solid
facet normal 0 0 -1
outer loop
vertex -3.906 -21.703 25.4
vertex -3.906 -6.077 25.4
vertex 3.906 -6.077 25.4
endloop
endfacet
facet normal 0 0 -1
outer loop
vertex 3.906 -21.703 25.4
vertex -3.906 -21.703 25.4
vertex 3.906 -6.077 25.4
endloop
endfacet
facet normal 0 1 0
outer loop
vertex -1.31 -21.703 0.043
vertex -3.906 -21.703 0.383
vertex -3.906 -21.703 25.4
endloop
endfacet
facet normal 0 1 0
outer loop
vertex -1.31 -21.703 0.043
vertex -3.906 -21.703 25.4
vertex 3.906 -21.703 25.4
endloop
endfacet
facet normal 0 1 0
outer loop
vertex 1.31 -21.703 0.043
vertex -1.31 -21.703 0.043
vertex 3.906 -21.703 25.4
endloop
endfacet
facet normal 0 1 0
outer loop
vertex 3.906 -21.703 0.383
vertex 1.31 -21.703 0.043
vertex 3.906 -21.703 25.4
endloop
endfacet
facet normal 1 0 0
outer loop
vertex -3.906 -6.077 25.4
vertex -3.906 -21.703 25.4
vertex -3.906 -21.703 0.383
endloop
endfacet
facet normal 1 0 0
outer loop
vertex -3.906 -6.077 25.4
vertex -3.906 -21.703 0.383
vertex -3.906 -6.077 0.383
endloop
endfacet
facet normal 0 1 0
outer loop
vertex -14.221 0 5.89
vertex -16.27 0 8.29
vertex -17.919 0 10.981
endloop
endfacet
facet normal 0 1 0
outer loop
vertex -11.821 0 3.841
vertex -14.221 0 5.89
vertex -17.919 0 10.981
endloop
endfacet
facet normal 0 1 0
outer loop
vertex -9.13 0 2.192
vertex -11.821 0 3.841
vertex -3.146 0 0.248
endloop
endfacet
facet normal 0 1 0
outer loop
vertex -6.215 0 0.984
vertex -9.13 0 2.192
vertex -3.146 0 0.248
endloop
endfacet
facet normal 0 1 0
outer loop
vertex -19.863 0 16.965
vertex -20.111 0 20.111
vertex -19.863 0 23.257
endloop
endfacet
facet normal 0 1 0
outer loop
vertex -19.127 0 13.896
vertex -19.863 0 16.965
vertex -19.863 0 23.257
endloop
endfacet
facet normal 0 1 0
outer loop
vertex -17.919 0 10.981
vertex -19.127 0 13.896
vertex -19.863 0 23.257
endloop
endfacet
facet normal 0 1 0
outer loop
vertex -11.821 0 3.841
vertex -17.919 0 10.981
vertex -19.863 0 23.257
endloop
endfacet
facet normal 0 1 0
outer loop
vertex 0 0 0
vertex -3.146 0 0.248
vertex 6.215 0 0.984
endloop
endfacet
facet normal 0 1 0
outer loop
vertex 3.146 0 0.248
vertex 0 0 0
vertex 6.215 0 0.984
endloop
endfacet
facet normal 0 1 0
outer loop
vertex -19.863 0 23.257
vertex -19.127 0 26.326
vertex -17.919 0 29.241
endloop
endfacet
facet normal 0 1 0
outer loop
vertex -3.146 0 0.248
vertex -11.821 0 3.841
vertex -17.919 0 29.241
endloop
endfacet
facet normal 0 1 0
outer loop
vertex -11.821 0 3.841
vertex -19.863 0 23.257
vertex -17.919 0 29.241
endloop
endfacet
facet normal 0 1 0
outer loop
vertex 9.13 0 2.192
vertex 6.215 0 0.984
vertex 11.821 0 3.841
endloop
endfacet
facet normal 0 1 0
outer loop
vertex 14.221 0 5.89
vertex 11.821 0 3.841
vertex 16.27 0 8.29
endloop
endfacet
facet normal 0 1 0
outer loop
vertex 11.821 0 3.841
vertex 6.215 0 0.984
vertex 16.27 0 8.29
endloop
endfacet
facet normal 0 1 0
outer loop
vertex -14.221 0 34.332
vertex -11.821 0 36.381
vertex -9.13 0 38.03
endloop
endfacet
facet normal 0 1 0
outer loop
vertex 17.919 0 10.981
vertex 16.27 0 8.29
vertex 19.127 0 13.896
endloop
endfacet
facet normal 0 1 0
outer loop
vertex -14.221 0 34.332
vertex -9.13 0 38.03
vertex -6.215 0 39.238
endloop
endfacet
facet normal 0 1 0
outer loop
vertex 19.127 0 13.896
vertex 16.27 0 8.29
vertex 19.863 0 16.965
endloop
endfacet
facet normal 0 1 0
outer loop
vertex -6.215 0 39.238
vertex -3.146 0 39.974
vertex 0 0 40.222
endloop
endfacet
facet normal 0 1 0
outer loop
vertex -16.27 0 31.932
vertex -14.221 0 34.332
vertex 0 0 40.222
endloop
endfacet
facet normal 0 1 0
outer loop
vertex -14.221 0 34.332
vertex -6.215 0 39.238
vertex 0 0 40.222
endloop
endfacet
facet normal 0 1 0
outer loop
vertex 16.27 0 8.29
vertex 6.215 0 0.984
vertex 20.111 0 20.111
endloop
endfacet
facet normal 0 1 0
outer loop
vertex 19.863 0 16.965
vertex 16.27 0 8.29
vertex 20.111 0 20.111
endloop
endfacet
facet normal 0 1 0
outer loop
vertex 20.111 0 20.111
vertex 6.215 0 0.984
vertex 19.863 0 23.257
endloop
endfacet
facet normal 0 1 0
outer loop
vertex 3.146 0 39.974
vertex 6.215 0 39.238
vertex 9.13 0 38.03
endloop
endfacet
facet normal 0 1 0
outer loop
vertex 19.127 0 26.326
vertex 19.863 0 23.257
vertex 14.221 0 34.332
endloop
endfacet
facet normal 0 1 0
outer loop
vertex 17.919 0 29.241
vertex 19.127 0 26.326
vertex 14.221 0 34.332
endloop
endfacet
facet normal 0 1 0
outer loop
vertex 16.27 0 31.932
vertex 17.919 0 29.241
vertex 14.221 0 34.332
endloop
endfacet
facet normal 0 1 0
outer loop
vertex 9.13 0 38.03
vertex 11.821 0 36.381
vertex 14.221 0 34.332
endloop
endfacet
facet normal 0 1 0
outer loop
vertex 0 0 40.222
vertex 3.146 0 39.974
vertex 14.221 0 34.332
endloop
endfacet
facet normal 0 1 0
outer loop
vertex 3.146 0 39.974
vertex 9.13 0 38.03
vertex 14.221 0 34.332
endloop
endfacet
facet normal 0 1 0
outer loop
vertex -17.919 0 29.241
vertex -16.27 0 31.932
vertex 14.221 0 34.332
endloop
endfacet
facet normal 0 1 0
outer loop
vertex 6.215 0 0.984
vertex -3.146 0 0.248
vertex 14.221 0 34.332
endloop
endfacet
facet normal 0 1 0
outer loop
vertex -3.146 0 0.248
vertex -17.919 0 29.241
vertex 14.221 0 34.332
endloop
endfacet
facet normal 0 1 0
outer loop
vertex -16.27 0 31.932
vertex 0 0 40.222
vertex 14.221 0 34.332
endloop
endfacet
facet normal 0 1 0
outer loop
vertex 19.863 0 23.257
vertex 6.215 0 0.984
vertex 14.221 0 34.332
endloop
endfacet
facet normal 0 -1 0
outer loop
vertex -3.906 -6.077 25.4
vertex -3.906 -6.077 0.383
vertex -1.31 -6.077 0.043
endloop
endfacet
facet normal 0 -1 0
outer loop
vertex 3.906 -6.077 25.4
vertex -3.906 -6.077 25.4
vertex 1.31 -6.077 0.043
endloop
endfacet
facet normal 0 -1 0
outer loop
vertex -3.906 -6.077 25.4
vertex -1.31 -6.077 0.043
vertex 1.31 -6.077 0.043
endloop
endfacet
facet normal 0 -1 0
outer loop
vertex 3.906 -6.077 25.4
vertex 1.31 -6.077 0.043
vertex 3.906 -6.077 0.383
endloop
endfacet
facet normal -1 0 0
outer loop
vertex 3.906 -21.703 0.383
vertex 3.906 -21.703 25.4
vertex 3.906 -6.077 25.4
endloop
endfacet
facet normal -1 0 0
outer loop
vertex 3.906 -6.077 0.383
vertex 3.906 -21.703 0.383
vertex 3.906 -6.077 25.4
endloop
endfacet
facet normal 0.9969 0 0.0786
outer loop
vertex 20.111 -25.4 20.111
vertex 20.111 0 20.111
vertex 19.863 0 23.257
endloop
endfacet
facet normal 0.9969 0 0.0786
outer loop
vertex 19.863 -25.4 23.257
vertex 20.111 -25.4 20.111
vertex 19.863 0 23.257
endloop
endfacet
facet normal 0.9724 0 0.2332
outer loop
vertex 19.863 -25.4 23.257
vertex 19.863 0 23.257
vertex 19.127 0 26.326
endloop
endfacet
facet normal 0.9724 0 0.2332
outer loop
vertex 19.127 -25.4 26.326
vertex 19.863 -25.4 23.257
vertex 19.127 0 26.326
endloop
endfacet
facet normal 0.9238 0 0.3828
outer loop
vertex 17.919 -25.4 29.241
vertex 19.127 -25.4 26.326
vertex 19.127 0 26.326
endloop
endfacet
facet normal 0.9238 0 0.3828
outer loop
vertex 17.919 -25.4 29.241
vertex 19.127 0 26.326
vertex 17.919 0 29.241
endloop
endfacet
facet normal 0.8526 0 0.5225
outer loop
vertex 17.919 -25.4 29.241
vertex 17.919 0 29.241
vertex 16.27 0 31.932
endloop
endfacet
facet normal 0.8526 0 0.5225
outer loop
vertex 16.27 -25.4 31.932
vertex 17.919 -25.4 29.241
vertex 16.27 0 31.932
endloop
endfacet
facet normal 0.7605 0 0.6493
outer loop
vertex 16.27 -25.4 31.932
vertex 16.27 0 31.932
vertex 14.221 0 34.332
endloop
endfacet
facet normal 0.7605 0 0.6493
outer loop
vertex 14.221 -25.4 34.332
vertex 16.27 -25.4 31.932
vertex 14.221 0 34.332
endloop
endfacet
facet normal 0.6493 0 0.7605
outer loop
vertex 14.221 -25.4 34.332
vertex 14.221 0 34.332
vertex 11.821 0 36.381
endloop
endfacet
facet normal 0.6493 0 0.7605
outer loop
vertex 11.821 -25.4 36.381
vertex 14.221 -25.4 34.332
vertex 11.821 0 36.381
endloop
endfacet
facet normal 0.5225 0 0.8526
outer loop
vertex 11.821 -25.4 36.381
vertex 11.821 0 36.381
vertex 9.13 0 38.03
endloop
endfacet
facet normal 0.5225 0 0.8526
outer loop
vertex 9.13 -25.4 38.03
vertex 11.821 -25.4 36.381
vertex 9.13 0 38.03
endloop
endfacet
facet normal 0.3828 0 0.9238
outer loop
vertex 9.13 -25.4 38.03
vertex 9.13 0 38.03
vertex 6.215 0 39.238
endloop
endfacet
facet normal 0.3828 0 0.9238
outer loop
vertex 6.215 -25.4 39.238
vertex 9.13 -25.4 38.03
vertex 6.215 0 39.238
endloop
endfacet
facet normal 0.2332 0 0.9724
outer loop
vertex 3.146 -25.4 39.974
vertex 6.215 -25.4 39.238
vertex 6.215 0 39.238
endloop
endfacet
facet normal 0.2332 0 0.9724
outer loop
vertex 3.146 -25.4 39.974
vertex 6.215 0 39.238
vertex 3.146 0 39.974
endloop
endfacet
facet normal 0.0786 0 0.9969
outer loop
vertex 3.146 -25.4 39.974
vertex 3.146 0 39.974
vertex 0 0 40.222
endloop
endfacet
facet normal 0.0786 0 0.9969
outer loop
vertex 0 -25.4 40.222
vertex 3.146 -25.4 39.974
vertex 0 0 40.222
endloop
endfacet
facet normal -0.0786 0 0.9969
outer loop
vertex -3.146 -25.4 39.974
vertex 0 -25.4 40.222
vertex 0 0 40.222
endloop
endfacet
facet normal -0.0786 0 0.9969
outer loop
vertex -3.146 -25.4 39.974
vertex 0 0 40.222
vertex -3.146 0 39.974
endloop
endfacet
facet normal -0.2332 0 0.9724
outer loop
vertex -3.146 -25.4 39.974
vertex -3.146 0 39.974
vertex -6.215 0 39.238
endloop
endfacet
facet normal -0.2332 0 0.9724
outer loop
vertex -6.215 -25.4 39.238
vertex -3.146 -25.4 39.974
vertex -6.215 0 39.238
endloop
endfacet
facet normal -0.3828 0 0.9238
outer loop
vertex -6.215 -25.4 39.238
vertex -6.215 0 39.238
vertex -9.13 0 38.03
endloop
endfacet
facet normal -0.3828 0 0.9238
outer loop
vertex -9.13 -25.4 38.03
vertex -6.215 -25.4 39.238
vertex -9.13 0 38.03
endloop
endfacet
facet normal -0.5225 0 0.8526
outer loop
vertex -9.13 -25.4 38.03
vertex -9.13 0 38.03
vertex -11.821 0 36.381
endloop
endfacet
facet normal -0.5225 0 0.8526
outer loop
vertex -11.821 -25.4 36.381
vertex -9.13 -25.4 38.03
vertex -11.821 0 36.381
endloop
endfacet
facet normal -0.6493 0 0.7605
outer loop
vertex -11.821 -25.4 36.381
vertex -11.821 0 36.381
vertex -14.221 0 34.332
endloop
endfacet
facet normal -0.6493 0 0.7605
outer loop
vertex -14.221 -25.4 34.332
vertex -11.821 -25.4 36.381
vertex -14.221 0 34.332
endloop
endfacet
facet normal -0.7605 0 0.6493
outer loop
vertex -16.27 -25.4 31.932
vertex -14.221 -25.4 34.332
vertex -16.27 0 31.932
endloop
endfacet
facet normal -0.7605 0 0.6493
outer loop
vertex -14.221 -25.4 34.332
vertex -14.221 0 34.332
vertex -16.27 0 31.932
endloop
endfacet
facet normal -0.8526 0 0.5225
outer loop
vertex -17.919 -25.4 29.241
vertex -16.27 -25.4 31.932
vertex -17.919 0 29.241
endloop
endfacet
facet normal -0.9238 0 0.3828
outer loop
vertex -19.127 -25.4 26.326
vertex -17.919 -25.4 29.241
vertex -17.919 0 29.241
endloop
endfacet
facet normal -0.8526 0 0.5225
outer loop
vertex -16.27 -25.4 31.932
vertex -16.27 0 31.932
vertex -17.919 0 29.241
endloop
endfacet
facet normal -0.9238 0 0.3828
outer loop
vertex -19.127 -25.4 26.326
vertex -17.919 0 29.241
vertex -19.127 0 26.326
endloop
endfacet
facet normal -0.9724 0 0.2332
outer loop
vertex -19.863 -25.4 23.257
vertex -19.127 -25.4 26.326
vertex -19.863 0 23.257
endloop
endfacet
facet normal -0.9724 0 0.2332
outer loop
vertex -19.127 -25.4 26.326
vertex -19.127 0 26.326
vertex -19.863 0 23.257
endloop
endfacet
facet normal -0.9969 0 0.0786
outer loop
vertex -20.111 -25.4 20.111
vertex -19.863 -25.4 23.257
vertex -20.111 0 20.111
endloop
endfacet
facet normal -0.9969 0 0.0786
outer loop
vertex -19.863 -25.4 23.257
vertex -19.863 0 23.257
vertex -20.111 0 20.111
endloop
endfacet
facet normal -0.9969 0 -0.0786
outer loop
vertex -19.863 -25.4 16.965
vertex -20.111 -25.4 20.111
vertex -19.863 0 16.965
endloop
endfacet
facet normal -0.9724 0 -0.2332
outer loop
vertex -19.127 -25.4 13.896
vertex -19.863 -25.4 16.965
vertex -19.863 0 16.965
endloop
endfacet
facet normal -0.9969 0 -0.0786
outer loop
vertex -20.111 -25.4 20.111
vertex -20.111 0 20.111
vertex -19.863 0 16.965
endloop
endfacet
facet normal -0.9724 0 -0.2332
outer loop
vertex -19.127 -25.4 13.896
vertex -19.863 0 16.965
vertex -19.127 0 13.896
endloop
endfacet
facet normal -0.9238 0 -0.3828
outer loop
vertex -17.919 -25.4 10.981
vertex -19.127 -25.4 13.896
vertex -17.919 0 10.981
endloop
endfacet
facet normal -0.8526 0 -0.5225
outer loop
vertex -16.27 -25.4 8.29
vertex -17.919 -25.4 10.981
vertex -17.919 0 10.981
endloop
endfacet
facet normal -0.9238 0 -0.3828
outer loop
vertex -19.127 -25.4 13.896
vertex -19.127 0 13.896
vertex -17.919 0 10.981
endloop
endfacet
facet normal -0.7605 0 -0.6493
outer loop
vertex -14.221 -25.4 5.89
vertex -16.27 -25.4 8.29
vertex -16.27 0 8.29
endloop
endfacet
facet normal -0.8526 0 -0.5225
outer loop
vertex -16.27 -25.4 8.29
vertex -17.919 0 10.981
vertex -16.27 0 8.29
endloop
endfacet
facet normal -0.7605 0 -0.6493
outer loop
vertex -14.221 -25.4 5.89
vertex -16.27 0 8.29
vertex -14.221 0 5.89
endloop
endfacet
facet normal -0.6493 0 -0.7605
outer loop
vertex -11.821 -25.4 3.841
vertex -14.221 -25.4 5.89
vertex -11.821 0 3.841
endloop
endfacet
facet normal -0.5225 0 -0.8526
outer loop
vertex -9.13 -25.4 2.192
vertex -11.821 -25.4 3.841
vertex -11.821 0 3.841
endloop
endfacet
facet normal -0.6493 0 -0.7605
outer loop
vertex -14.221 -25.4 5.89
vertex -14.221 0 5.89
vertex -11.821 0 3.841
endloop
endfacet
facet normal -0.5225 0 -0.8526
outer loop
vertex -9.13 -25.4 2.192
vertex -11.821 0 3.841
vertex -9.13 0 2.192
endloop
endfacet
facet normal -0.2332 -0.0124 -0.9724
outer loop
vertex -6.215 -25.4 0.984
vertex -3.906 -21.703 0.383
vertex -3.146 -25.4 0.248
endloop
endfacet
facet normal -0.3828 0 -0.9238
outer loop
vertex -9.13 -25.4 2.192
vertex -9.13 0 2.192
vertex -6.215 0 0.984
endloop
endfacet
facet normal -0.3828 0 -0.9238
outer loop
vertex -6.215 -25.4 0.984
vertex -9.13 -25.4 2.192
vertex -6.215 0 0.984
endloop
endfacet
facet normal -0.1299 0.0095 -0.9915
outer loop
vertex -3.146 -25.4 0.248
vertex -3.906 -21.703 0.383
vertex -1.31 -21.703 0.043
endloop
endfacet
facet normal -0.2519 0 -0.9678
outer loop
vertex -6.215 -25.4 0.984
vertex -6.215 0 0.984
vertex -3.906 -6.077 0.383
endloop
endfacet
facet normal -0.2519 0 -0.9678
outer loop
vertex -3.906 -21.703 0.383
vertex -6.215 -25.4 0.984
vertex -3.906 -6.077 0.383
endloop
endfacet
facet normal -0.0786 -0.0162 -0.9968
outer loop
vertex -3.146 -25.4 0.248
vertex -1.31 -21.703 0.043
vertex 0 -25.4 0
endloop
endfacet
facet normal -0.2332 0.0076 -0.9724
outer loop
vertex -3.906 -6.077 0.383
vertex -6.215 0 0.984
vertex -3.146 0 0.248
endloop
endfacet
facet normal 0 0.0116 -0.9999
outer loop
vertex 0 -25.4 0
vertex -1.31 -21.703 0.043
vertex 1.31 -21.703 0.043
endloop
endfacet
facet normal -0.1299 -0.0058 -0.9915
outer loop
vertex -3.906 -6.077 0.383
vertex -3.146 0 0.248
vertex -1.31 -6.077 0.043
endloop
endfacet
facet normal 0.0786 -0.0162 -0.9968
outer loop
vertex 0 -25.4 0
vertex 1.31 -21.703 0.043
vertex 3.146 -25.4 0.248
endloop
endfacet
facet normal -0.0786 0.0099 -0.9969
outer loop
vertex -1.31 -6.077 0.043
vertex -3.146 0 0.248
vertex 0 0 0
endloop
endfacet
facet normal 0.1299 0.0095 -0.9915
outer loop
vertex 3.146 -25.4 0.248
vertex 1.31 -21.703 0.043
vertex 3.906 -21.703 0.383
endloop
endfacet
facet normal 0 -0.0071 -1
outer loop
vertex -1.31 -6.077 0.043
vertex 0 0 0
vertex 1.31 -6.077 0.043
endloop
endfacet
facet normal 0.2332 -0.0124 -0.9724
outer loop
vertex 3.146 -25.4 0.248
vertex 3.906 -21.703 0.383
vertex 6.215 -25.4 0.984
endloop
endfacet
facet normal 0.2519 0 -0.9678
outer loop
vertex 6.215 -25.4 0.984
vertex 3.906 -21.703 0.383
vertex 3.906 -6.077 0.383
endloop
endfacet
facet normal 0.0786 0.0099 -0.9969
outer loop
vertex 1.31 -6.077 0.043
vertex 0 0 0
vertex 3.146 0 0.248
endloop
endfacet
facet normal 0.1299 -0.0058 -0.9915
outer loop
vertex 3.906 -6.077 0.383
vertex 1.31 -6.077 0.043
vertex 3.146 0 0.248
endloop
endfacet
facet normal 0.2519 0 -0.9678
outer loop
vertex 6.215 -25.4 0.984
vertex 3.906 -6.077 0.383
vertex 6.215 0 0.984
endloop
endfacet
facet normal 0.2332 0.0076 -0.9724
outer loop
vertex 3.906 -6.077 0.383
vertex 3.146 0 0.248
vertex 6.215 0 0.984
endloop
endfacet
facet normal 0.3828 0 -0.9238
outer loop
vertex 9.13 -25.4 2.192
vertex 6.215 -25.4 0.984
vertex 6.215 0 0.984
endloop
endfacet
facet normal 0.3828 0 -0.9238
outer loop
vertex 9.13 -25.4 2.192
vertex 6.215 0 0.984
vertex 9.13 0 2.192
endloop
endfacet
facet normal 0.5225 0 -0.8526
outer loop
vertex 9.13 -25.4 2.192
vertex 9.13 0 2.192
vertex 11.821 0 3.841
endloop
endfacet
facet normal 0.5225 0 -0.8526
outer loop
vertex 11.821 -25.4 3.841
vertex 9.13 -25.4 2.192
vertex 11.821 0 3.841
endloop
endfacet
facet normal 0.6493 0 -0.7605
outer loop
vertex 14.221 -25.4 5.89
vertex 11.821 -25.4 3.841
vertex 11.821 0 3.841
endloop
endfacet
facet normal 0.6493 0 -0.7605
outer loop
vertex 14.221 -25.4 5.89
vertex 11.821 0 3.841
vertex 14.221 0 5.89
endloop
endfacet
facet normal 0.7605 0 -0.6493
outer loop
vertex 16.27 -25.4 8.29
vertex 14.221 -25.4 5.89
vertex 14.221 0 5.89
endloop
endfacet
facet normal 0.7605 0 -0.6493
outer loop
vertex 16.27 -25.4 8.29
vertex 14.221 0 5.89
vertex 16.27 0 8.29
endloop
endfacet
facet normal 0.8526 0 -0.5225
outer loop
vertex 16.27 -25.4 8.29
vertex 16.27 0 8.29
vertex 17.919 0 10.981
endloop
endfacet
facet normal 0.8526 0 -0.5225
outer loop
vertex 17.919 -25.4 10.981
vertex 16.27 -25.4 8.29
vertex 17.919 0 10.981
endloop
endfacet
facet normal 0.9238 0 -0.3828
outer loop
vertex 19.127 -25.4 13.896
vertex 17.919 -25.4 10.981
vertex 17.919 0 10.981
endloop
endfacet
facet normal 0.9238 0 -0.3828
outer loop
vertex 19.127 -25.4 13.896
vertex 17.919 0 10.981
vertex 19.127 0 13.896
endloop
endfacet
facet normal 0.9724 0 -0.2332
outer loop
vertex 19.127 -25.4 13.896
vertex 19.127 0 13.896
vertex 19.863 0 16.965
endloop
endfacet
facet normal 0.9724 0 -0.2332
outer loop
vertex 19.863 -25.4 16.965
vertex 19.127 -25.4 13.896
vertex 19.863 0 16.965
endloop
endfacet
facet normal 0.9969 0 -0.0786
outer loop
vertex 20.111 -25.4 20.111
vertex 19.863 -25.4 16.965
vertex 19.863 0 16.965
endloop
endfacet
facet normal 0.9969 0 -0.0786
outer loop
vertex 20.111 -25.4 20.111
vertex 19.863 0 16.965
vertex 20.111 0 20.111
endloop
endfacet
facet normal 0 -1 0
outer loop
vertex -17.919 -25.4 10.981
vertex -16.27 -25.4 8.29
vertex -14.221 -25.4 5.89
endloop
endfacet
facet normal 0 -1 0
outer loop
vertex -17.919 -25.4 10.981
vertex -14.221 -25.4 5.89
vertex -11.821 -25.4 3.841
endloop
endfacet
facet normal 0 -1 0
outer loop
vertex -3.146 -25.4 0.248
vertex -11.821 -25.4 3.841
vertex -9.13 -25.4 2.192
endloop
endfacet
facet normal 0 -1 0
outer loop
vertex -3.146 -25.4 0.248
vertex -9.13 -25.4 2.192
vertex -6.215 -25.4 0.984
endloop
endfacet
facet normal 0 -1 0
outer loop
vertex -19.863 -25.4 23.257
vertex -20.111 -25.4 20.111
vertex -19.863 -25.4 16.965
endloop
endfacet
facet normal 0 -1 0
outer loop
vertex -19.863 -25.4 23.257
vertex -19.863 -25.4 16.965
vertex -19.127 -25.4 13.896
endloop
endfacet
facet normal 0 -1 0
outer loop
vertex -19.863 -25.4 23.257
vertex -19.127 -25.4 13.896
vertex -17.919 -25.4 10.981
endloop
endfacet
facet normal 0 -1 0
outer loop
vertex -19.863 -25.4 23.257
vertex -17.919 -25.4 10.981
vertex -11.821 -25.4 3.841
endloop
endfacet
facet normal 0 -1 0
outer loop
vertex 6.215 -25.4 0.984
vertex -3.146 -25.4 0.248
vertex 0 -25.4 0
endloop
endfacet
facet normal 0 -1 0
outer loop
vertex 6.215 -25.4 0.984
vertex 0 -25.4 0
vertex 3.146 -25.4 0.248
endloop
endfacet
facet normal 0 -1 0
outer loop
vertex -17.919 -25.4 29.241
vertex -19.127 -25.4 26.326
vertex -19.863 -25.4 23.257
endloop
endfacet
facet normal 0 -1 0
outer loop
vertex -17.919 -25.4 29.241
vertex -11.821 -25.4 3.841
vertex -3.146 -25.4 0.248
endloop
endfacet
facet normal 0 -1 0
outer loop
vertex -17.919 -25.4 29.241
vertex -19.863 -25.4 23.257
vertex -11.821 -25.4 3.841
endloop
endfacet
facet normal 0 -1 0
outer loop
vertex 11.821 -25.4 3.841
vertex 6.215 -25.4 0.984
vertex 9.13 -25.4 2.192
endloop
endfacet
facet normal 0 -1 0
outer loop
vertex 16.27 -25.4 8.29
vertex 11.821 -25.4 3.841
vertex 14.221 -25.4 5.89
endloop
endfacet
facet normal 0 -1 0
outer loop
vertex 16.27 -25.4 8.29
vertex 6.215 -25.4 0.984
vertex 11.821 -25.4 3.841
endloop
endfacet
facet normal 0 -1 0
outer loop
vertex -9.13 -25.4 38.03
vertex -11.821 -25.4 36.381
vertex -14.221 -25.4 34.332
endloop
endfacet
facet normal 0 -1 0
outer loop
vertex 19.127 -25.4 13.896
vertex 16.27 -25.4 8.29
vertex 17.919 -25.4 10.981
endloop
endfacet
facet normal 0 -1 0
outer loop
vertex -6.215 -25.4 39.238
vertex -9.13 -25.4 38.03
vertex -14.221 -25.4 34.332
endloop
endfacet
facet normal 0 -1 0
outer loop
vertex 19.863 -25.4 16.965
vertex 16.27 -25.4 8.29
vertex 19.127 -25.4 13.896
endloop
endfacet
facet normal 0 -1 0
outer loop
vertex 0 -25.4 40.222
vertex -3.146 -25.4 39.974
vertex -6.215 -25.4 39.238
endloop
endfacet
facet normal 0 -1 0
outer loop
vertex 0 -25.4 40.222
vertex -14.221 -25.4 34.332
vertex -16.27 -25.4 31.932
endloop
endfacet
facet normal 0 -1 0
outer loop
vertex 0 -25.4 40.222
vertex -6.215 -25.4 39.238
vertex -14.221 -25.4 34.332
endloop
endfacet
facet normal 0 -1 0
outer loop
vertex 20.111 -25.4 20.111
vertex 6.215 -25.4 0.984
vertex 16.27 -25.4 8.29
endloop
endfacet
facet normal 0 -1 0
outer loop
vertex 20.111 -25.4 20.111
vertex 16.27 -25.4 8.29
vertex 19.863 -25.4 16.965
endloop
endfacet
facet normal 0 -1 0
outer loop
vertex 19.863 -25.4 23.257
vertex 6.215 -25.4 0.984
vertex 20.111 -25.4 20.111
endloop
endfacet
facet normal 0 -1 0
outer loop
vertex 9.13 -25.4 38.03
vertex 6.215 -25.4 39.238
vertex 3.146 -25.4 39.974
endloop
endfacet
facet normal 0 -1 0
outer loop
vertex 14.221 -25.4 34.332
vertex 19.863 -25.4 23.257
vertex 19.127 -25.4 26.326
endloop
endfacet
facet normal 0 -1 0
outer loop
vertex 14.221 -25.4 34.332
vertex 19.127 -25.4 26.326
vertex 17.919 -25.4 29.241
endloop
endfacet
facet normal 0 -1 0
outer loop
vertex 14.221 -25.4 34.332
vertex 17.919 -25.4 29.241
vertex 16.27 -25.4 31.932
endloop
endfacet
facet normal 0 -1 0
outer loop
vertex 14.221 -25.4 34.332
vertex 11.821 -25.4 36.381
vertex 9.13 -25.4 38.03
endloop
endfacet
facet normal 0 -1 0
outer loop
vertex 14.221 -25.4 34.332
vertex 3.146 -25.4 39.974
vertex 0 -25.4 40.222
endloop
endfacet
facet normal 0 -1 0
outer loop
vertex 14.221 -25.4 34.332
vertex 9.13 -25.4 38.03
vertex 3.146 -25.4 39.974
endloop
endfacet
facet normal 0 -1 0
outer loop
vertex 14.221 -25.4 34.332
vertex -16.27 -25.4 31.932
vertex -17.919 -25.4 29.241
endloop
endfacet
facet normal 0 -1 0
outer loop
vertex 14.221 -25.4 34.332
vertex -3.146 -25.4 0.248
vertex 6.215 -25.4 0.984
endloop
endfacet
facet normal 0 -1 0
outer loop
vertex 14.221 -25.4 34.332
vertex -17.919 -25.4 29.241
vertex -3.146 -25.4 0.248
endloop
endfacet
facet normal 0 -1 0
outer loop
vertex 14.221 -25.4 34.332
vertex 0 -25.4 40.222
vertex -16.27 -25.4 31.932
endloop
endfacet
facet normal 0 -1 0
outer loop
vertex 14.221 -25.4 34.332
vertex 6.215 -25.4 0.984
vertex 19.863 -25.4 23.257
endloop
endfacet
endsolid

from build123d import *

# Parameters (mm, degrees)
F1_R     = 20.111013
F2_DEPTH = 25.4
F3_W     = 7.812914
F3_H     = 15.625822
F4_DEPTH = 25.4


with BuildPart() as f2:
    # F1 (on Front) → F2 (new body)
    with BuildSketch(Plane.XZ):
        with Locations((0, 20.111013)):
            Circle(F1_R)
    extrude(amount=F2_DEPTH)

    # F3 (on Top) → F4 (cut)
    with BuildSketch(Plane.XY):
        with Locations((0, -13.889621)):
            Rectangle(F3_W, F3_H)
    extrude(amount=F4_DEPTH, mode=Mode.SUBTRACT)


solid = f2.part
